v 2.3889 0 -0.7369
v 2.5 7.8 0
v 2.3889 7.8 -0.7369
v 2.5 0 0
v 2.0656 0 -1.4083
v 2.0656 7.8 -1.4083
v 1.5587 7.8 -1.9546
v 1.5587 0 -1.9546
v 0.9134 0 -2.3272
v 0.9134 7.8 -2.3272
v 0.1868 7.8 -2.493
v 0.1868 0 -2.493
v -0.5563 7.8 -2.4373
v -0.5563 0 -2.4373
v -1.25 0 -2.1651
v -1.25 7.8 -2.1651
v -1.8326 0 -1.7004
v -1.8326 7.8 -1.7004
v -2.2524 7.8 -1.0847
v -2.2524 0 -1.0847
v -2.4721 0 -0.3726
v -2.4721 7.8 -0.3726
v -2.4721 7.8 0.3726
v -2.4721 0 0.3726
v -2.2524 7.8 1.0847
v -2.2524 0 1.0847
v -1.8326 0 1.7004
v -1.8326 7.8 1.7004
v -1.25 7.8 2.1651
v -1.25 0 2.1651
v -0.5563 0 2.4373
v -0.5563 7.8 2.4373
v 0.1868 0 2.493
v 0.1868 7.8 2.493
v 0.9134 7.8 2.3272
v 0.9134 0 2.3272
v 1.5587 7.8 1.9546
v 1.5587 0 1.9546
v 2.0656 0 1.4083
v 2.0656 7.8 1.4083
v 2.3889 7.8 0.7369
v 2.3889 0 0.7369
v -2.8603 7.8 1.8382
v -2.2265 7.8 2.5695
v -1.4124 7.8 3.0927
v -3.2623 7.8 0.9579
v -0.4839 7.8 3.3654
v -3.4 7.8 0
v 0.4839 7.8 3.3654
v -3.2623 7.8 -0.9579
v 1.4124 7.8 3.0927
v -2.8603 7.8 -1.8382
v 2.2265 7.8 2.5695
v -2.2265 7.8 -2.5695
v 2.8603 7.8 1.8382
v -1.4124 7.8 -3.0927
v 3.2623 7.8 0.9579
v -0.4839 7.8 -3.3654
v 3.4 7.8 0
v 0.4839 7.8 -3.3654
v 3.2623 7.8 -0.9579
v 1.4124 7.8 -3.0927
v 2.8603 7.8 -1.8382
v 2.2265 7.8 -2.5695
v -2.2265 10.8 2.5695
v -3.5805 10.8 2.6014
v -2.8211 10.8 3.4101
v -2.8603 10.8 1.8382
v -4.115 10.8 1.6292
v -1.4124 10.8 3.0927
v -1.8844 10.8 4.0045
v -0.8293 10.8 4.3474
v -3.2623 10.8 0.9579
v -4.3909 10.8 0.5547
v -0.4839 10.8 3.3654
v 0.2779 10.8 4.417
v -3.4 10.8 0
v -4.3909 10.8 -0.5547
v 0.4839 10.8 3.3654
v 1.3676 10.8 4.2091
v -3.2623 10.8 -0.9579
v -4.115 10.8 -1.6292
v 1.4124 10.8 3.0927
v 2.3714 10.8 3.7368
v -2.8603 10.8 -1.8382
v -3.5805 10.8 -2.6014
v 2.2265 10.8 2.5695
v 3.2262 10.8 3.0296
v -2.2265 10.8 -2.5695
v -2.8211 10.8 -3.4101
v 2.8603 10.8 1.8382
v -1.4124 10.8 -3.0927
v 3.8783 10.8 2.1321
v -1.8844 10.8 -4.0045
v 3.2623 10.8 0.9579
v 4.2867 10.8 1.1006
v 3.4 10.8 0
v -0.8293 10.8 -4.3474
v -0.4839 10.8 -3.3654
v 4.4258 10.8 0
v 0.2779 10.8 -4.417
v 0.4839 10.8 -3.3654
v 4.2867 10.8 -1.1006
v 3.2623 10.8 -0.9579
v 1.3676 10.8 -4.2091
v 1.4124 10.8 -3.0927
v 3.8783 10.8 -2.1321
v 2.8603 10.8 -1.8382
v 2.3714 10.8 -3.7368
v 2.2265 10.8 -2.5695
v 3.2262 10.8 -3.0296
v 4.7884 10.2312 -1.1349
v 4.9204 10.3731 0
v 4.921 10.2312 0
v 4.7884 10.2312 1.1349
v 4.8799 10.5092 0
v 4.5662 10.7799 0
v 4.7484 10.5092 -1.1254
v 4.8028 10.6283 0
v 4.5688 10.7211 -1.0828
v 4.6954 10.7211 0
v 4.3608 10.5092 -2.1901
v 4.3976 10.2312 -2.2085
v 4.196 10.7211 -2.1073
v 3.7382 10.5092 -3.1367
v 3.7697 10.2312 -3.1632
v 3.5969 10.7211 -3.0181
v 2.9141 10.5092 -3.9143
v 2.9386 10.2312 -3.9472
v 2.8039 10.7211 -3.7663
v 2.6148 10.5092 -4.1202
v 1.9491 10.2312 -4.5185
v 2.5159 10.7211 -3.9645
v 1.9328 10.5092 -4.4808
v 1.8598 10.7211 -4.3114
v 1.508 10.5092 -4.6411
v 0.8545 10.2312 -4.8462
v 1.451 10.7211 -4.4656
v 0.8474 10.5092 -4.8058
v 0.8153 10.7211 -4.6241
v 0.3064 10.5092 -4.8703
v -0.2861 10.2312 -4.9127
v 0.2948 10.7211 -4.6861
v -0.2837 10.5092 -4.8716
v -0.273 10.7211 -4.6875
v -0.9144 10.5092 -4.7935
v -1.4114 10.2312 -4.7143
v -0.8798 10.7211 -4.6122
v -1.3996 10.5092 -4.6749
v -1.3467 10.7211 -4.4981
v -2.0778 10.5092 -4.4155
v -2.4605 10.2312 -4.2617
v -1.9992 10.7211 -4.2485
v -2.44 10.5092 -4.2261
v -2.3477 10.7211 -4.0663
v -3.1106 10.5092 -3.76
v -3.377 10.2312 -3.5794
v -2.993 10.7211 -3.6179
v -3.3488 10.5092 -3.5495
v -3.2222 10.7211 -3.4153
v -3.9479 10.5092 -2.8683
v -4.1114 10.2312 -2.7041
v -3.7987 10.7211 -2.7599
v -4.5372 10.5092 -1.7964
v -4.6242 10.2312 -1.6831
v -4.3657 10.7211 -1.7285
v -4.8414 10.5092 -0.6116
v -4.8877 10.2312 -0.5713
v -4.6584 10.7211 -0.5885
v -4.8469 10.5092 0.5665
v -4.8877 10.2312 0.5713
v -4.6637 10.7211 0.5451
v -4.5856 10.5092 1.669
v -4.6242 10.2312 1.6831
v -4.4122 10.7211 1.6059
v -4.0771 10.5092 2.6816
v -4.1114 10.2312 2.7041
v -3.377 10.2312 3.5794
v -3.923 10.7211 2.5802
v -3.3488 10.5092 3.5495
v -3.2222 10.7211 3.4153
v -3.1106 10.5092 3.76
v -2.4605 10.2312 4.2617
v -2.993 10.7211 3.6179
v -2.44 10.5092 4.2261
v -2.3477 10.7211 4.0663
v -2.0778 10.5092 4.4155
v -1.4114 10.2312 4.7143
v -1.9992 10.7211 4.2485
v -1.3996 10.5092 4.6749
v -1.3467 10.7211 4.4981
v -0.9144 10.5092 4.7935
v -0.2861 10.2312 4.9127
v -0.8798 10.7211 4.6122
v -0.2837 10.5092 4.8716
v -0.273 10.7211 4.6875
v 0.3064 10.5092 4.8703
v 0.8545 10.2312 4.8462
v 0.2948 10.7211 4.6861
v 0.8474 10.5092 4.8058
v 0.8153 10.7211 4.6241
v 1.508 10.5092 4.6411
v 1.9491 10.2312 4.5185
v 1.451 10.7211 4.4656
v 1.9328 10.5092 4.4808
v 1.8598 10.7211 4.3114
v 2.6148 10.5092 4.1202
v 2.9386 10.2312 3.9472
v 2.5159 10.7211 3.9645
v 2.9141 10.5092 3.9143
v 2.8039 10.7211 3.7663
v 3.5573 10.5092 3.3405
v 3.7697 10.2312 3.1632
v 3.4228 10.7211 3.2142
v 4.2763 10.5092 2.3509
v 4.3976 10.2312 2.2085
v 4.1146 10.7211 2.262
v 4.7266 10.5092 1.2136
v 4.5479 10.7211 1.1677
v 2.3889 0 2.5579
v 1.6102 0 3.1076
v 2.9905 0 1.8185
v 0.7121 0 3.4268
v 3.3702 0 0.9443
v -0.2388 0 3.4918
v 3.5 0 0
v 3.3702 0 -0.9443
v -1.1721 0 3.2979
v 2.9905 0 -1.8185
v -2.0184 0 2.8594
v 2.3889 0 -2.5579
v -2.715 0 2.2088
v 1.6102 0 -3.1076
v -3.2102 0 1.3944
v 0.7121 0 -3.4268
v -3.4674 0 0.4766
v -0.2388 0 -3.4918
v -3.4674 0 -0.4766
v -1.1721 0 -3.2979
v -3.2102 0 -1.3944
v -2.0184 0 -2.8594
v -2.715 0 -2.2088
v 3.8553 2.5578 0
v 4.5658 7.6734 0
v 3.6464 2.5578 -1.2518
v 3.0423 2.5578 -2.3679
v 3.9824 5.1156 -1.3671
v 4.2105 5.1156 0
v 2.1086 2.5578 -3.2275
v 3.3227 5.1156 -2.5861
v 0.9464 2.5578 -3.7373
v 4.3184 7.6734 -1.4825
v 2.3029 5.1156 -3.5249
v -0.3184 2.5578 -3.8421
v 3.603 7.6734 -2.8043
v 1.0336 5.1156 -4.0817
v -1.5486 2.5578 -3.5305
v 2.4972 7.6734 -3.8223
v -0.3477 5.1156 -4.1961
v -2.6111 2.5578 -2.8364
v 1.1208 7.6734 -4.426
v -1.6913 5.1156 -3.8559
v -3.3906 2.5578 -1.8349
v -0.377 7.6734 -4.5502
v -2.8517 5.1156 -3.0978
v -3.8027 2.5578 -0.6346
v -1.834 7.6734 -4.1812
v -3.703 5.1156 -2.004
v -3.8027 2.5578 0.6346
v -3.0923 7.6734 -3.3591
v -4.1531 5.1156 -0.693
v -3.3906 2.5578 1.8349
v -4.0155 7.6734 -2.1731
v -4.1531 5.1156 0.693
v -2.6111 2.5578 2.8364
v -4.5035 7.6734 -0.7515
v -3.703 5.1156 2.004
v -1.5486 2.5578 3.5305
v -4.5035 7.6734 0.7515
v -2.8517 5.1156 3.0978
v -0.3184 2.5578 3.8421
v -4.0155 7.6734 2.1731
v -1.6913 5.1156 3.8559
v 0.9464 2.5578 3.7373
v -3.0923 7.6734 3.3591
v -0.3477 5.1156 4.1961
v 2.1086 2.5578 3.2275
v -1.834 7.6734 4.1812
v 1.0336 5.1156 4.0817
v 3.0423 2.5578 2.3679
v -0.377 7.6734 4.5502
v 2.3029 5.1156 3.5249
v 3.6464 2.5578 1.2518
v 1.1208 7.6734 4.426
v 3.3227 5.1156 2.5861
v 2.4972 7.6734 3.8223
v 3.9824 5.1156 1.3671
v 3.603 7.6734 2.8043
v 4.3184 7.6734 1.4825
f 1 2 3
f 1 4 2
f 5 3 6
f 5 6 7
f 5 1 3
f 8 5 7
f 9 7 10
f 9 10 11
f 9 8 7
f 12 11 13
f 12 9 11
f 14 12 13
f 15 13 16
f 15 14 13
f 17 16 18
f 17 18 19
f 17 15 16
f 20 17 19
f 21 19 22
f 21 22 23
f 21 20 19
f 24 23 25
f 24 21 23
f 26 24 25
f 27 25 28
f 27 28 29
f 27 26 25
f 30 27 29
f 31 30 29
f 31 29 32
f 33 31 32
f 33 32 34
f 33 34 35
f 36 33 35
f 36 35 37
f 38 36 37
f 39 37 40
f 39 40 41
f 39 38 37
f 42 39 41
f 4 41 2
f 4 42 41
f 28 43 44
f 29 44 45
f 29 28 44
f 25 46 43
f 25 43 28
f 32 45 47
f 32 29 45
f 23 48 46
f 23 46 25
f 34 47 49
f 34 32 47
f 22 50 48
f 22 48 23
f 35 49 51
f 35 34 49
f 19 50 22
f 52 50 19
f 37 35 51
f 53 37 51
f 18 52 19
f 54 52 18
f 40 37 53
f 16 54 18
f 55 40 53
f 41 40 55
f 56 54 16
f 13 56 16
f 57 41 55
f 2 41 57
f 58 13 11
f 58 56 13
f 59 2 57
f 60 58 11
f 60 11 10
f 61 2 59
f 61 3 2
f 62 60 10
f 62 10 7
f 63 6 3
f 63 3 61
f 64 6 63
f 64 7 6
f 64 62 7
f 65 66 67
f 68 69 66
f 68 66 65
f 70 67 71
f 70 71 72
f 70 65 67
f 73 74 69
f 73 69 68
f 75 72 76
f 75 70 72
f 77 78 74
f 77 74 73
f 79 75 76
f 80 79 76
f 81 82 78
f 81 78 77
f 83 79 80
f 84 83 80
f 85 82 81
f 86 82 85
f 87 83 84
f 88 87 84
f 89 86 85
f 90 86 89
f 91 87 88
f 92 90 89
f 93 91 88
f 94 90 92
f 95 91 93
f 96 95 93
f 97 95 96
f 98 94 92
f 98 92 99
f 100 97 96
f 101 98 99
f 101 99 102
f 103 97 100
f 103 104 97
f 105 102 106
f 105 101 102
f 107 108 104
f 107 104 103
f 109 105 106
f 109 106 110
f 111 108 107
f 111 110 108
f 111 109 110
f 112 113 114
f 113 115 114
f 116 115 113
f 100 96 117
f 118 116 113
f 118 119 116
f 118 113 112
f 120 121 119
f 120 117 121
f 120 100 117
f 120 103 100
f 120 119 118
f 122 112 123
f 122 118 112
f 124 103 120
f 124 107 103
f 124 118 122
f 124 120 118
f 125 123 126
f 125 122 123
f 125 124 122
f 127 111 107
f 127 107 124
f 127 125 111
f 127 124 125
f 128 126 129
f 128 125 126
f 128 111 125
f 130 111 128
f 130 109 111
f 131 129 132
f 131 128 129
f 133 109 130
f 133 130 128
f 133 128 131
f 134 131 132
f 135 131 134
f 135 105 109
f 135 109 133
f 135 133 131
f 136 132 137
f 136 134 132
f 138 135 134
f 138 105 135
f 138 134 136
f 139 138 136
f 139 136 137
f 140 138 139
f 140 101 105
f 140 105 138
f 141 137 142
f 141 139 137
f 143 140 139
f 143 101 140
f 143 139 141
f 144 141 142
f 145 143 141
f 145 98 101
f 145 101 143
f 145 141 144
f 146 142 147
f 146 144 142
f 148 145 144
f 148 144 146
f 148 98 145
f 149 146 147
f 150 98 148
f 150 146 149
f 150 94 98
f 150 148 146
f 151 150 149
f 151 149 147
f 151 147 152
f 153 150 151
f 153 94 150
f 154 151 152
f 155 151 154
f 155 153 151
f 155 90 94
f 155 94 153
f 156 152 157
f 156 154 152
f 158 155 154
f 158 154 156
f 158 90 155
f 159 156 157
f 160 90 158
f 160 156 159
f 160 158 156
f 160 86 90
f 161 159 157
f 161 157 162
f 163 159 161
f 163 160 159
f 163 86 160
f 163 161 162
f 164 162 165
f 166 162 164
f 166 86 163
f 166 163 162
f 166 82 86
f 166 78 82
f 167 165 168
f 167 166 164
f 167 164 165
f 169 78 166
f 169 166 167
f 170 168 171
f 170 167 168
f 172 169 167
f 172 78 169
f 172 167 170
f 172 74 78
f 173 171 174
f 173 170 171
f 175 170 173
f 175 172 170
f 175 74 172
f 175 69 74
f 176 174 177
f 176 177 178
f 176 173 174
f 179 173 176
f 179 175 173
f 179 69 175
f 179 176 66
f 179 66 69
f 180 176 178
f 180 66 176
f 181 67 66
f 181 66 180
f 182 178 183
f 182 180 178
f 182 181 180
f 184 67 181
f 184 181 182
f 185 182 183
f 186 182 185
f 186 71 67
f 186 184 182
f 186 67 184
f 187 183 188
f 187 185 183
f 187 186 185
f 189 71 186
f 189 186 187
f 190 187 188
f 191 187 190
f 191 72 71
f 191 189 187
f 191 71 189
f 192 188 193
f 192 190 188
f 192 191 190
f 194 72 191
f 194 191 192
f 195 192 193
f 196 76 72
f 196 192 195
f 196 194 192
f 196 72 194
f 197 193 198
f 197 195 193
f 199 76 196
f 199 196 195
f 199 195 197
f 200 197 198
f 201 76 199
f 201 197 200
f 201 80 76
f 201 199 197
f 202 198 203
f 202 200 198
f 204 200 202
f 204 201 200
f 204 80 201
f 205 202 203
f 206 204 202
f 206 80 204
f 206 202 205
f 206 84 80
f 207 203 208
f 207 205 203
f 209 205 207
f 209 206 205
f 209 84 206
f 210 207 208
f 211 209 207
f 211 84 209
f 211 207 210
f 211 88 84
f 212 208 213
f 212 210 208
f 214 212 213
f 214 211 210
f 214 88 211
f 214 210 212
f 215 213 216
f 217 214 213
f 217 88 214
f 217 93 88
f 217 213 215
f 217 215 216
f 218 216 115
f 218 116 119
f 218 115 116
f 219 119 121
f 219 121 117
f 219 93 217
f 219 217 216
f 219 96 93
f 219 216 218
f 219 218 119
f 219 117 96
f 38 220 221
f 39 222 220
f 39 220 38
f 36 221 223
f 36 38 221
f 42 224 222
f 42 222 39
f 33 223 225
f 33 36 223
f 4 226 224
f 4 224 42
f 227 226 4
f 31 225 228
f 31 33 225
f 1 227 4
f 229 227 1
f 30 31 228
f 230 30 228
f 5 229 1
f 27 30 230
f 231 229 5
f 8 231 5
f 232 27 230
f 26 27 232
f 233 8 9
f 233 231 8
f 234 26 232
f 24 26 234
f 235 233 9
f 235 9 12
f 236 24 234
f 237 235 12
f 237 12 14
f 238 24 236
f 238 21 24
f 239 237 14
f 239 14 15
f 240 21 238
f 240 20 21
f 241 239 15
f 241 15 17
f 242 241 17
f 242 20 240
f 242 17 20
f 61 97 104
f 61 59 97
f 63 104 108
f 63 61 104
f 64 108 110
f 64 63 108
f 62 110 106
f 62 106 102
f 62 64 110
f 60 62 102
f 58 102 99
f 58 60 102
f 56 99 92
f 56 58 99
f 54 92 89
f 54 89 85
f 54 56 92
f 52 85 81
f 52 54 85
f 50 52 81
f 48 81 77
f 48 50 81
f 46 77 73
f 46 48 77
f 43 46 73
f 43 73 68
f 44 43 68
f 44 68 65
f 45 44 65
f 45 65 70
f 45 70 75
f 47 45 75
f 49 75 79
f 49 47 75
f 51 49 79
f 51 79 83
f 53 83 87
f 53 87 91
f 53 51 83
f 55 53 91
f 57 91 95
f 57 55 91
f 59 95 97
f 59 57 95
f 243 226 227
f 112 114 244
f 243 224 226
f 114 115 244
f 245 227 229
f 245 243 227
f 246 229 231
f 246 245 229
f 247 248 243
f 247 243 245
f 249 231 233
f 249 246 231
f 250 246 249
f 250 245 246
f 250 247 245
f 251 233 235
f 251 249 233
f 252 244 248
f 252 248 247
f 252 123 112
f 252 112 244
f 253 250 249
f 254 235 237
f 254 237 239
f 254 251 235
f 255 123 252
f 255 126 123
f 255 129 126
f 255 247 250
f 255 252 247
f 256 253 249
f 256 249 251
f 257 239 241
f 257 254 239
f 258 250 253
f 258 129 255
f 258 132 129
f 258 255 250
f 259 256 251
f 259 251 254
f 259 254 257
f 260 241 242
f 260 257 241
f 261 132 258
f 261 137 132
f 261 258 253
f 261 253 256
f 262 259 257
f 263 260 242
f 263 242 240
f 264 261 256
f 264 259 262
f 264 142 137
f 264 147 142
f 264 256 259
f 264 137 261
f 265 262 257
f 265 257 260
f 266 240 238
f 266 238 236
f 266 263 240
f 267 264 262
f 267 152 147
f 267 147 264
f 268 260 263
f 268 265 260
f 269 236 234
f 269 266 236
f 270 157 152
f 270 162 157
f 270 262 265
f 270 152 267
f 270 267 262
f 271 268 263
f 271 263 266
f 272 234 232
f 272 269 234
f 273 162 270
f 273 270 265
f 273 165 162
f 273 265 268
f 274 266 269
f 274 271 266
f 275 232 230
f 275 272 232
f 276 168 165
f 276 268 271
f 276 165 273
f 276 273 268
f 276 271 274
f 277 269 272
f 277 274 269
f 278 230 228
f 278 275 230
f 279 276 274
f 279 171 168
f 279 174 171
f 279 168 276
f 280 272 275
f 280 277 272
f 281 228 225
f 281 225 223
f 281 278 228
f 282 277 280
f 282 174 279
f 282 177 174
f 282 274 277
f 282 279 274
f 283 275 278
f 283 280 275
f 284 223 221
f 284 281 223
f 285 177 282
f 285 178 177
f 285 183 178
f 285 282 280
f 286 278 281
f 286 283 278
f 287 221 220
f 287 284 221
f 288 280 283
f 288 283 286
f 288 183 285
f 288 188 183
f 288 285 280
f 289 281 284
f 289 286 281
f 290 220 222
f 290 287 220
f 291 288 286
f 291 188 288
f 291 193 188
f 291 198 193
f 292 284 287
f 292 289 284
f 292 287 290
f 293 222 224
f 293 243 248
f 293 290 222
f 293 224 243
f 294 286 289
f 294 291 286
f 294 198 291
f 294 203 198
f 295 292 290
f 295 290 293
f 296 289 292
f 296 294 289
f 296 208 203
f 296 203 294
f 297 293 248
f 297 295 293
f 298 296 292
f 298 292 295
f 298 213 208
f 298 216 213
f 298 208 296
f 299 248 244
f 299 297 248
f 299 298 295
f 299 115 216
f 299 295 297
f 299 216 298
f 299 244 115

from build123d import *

# Parameters (mm, degrees)
FILLET1_R = 0.5


with BuildPart() as part:
    # Sketch1 → Revolve1 (revolve)
    with BuildSketch(Plane.XY):
        Polygon((2.5, 0), (3.5, 0), (5, 10.8), (3.4, 10.8), (3.4, 7.8), (2.5, 7.8), align=None)
    revolve(axis=Axis((0, 0, 0), (0, 1, 0)))

    # Fillet1
    fillet1_edges = [part.edges().sort_by_distance(p)[0] for p in [
        (-5, 10.8, 0),
    ]]
    fillet(fillet1_edges, radius=FILLET1_R)


solid = part.part
